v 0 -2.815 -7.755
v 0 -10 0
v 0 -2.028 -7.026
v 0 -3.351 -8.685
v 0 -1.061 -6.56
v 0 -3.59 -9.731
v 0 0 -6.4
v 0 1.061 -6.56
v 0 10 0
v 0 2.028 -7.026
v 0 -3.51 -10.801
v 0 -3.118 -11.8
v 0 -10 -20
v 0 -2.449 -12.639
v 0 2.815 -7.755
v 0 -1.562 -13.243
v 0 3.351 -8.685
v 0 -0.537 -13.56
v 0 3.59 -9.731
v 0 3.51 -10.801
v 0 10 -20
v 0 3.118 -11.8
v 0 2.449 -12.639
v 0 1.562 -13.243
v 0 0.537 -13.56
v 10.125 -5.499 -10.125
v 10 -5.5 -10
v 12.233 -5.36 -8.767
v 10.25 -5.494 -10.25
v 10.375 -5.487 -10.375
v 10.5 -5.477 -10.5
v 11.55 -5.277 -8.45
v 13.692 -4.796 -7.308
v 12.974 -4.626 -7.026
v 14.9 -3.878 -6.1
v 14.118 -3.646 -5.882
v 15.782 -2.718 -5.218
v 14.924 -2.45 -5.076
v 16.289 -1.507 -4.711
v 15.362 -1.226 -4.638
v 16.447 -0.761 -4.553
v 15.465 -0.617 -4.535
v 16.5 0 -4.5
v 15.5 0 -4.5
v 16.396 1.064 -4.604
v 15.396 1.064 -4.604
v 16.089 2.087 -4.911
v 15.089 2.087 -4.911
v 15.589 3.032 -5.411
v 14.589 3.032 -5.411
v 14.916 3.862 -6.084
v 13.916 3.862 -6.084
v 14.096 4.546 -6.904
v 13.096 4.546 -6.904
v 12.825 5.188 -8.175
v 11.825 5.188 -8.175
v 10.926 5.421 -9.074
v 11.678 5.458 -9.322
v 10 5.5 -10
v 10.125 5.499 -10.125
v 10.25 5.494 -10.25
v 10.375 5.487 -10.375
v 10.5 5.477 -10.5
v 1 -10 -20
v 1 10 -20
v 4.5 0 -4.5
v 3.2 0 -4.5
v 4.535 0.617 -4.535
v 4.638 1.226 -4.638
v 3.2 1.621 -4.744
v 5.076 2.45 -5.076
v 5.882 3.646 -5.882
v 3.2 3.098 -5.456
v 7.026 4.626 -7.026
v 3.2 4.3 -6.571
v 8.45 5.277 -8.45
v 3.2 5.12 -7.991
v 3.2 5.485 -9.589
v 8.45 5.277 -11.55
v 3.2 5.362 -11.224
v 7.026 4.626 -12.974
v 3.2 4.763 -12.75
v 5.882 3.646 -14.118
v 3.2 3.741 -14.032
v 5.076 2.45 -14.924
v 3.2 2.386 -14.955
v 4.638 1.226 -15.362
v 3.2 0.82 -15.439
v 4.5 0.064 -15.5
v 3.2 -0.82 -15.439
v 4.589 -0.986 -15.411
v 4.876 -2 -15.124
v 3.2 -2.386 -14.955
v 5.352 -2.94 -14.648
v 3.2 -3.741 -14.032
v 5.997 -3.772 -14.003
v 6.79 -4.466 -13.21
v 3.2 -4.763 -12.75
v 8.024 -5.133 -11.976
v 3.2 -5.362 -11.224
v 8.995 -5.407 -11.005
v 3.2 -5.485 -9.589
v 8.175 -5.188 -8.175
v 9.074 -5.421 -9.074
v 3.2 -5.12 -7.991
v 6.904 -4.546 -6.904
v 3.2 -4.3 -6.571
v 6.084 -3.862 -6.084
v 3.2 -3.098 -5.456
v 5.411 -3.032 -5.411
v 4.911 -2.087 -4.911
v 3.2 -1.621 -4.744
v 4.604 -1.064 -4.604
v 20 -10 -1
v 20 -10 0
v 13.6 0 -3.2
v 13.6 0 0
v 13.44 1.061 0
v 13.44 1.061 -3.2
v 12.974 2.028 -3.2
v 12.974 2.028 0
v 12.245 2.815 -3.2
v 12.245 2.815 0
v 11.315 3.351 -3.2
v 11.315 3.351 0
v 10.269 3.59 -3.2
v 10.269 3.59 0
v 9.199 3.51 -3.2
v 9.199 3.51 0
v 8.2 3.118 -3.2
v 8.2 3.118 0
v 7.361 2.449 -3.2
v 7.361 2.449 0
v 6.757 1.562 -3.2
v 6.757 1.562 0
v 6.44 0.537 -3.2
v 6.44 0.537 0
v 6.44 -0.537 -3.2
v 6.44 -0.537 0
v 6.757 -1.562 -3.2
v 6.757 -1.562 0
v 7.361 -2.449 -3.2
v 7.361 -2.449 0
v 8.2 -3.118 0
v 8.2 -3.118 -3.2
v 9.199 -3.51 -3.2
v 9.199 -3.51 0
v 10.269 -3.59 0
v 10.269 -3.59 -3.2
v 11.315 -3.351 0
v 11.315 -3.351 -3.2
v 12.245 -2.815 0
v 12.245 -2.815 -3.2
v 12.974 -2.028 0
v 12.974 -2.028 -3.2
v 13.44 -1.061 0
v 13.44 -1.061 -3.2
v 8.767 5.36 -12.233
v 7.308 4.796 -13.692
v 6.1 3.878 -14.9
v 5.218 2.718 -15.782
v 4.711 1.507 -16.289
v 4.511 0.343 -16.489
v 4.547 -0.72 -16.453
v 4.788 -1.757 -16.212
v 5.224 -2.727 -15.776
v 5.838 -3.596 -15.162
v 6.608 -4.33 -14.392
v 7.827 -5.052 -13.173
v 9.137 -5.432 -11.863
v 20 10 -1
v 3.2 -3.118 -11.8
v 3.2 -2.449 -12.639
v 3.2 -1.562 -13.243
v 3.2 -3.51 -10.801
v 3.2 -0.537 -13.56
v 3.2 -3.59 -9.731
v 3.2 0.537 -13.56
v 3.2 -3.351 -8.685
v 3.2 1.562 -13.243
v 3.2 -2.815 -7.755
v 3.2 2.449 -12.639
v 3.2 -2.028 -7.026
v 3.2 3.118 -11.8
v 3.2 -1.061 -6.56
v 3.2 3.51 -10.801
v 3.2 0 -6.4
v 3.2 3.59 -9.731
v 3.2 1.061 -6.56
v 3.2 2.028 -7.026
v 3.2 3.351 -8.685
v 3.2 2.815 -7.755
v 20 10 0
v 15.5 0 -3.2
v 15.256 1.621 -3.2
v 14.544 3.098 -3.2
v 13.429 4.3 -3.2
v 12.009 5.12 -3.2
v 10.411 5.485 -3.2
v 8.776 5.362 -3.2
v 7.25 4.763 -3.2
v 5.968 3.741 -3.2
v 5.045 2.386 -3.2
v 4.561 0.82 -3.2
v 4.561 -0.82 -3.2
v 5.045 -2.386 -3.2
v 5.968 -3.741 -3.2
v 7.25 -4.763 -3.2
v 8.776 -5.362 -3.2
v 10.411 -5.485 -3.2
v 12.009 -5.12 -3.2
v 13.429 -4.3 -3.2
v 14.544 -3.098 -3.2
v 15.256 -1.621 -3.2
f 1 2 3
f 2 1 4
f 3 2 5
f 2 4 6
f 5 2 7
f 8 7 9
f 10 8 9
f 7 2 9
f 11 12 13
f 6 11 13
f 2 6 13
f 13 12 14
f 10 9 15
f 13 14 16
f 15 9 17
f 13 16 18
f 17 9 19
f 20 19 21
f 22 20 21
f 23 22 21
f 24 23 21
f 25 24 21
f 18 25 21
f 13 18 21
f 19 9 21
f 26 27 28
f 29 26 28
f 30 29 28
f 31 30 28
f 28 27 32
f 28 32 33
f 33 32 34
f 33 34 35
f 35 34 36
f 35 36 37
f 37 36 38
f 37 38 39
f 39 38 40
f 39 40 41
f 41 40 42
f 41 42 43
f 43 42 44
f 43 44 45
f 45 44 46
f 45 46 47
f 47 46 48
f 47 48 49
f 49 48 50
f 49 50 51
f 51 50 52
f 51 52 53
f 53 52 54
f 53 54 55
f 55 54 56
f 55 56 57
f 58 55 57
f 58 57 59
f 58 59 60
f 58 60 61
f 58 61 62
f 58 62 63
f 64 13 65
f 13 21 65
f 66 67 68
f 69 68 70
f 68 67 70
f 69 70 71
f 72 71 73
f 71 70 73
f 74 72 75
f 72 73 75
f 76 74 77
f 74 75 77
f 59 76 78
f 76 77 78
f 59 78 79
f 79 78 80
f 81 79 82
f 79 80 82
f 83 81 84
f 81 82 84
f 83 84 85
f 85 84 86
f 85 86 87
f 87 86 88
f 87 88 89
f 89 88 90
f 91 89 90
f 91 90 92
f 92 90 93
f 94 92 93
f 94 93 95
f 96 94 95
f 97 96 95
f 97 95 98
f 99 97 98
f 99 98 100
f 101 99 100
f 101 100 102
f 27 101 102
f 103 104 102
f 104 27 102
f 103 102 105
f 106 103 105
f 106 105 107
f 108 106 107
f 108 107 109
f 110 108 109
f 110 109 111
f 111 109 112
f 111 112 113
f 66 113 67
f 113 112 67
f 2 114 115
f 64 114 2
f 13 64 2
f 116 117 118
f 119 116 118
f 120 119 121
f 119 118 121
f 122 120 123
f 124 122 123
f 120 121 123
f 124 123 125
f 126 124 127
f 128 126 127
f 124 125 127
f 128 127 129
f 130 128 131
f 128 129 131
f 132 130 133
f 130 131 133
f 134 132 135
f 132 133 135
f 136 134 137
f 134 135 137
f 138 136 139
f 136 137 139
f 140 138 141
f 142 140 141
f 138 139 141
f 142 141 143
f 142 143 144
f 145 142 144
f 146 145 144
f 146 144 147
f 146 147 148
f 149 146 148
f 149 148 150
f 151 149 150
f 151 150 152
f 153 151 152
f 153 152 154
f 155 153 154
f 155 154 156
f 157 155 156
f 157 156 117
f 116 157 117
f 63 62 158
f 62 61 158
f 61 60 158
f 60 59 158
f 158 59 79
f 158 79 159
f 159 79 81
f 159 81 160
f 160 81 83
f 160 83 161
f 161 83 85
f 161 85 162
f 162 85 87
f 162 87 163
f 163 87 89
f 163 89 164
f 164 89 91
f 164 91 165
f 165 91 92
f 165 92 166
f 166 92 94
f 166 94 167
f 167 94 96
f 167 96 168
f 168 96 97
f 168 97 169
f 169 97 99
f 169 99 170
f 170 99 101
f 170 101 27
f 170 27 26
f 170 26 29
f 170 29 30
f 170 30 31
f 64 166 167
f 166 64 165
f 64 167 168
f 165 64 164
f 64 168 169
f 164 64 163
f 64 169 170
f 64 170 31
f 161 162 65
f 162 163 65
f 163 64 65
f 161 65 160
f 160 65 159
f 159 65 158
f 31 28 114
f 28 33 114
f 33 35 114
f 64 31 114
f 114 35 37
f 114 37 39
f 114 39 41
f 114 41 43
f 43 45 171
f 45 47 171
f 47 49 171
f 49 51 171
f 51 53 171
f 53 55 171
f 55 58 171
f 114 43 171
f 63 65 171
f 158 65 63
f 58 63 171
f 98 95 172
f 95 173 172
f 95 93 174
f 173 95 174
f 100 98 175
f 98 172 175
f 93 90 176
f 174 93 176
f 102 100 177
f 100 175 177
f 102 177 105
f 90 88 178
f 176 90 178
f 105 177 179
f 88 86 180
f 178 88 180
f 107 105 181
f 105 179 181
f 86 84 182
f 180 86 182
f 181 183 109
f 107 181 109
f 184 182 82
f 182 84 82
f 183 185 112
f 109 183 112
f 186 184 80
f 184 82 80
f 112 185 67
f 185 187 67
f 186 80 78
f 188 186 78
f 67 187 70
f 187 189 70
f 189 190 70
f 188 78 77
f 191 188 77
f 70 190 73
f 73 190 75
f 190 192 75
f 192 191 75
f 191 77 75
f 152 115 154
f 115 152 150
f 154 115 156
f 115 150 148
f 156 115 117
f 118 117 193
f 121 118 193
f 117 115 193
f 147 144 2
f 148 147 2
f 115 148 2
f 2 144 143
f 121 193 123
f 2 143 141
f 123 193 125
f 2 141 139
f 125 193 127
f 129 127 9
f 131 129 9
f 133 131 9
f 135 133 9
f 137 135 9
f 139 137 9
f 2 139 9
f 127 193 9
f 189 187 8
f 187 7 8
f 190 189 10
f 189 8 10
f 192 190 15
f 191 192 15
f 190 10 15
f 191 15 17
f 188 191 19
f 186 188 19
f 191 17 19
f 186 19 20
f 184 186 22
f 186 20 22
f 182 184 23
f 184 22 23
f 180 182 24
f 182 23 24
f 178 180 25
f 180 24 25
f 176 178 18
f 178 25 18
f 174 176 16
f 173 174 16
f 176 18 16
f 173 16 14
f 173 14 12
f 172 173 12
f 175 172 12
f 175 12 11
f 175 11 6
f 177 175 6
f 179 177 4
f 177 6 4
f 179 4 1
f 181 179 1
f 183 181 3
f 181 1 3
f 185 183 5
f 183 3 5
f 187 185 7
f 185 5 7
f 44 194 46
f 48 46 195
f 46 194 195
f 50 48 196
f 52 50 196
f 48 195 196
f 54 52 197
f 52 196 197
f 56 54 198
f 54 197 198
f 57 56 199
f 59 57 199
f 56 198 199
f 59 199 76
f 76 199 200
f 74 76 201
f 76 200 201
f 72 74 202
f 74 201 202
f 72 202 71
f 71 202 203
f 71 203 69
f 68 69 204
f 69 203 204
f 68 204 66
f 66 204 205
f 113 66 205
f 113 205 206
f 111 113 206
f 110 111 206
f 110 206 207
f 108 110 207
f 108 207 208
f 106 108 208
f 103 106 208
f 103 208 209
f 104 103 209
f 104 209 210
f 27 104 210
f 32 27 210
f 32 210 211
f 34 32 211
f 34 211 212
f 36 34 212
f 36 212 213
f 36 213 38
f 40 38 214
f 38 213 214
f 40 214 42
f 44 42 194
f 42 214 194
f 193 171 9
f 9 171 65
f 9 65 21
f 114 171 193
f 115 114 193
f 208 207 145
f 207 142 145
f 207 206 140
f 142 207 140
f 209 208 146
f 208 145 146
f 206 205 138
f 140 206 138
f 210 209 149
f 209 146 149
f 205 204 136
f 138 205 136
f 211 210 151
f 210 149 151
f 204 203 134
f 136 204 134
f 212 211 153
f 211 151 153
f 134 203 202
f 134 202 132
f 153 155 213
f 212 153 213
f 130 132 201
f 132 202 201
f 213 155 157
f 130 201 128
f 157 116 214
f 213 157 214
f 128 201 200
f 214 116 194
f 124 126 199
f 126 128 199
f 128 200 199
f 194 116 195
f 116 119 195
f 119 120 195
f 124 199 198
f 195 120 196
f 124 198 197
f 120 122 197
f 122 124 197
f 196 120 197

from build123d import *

# Parameters (mm, degrees)
BOSS_EXTRUDE1_DEPTH = 10
CUT_EXTRUDE1_REACH  = 32
SKETCH3_R           = 3.6
CUT_EXTRUDE3_REACH  = 39.344
CUT_EXTRUDE3_START  = -3.2
SKETCH3_4_R         = 5.5
SKETCH3_4_R_2       = 3.6
CUT_EXTRUDE2_REACH  = 32
SKETCH4_R           = 3.6
CUT_EXTRUDE4_REACH  = 35.2
CUT_EXTRUDE4_START  = -3.2
SKETCH4_3_R         = 5.5
SKETCH4_3_R_2       = 3.6


with BuildPart() as part:
    # Sketch2 → Boss-Extrude1 (new, symmetric)
    with BuildSketch(Plane(origin=(0, 0, 0), x_dir=(1, 0, 0), z_dir=(0, 1, 0))):
        Polygon((0, 0), (0, 20), (1, 20), (20, 1), (20, 0), align=None)
    extrude(amount=BOSS_EXTRUDE1_DEPTH, both=True)

    # Cut-Extrude1: up to this plane
    cut_extrude1_end = Plane(origin=(1, 10, -20), z_dir=(-0.7071067811865476, 0, 0.7071067811865476))
    # Sketch3 → Cut-Extrude1 (cut, up to the surface)
    with BuildSketch(Plane.XY, mode=Mode.PRIVATE) as cut_extrude1_sk1:
        with Locations((10, 0)):
            Circle(SKETCH3_R)
    cut_extrude1_tool1 = split(extrude(cut_extrude1_sk1.sketch, amount=-CUT_EXTRUDE1_REACH, mode=Mode.PRIVATE), bisect_by=cut_extrude1_end, keep=Keep.BOTH, mode=Mode.PRIVATE)
    add(cut_extrude1_tool1.solids().sort_by_distance((10, 0, 0))[0], mode=Mode.SUBTRACT)

    # Cut-Extrude3: up to this plane
    cut_extrude3_end = Plane(origin=(1, 10, -20), z_dir=(-0.7071067811865476, 0, 0.7071067811865476))
    # Sketch3<4> → Cut-Extrude3 (cut, up to the surface)
    with BuildSketch(Plane.XY.offset(CUT_EXTRUDE3_START), mode=Mode.PRIVATE) as cut_extrude3_sk1:
        with Locations((10, 0)):
            Circle(SKETCH3_4_R)
        with Locations((10, 0)):
            Circle(SKETCH3_4_R_2, mode=Mode.SUBTRACT)
    cut_extrude3_tool1 = split(extrude(cut_extrude3_sk1.sketch, amount=-CUT_EXTRUDE3_REACH, mode=Mode.PRIVATE), bisect_by=cut_extrude3_end, keep=Keep.BOTH, mode=Mode.PRIVATE)
    add(cut_extrude3_tool1.solids().sort_by_distance((4.655563, 0, -3.2))[0], mode=Mode.SUBTRACT)

    # Cut-Extrude2: up to this plane
    cut_extrude2_end = Plane(origin=(1, 10, -20), z_dir=(-0.7071067811865476, 0, 0.7071067811865476))
    # Sketch4 → Cut-Extrude2 (cut, up to the surface)
    with BuildSketch(Plane.ZY, mode=Mode.PRIVATE) as cut_extrude2_sk1:
        with Locations((-10, 0)):
            Circle(SKETCH4_R)
    cut_extrude2_tool1 = split(extrude(cut_extrude2_sk1.sketch, amount=-CUT_EXTRUDE2_REACH, mode=Mode.PRIVATE), bisect_by=cut_extrude2_end, keep=Keep.BOTH, mode=Mode.PRIVATE)
    add(cut_extrude2_tool1.solids().sort_by_distance((0, 0, -10))[0], mode=Mode.SUBTRACT)

    # Cut-Extrude4: up to this plane
    cut_extrude4_end = Plane(origin=(1, 10, -20), z_dir=(-0.7071067811865476, 0, 0.7071067811865476))
    # Sketch4<3> → Cut-Extrude4 (cut, up to the surface)
    with BuildSketch(Plane.ZY.offset(CUT_EXTRUDE4_START), mode=Mode.PRIVATE) as cut_extrude4_sk1:
        with Locations((-10, 0)):
            Circle(SKETCH4_3_R)
        with Locations((-10, 0)):
            Circle(SKETCH4_3_R_2, mode=Mode.SUBTRACT)
    cut_extrude4_tool1 = split(extrude(cut_extrude4_sk1.sketch, amount=-CUT_EXTRUDE4_REACH, mode=Mode.PRIVATE), bisect_by=cut_extrude4_end, keep=Keep.BOTH, mode=Mode.PRIVATE)
    add(cut_extrude4_tool1.solids().sort_by_distance((3.2, 0, -15.344437))[0], mode=Mode.SUBTRACT)


solid = part.part
